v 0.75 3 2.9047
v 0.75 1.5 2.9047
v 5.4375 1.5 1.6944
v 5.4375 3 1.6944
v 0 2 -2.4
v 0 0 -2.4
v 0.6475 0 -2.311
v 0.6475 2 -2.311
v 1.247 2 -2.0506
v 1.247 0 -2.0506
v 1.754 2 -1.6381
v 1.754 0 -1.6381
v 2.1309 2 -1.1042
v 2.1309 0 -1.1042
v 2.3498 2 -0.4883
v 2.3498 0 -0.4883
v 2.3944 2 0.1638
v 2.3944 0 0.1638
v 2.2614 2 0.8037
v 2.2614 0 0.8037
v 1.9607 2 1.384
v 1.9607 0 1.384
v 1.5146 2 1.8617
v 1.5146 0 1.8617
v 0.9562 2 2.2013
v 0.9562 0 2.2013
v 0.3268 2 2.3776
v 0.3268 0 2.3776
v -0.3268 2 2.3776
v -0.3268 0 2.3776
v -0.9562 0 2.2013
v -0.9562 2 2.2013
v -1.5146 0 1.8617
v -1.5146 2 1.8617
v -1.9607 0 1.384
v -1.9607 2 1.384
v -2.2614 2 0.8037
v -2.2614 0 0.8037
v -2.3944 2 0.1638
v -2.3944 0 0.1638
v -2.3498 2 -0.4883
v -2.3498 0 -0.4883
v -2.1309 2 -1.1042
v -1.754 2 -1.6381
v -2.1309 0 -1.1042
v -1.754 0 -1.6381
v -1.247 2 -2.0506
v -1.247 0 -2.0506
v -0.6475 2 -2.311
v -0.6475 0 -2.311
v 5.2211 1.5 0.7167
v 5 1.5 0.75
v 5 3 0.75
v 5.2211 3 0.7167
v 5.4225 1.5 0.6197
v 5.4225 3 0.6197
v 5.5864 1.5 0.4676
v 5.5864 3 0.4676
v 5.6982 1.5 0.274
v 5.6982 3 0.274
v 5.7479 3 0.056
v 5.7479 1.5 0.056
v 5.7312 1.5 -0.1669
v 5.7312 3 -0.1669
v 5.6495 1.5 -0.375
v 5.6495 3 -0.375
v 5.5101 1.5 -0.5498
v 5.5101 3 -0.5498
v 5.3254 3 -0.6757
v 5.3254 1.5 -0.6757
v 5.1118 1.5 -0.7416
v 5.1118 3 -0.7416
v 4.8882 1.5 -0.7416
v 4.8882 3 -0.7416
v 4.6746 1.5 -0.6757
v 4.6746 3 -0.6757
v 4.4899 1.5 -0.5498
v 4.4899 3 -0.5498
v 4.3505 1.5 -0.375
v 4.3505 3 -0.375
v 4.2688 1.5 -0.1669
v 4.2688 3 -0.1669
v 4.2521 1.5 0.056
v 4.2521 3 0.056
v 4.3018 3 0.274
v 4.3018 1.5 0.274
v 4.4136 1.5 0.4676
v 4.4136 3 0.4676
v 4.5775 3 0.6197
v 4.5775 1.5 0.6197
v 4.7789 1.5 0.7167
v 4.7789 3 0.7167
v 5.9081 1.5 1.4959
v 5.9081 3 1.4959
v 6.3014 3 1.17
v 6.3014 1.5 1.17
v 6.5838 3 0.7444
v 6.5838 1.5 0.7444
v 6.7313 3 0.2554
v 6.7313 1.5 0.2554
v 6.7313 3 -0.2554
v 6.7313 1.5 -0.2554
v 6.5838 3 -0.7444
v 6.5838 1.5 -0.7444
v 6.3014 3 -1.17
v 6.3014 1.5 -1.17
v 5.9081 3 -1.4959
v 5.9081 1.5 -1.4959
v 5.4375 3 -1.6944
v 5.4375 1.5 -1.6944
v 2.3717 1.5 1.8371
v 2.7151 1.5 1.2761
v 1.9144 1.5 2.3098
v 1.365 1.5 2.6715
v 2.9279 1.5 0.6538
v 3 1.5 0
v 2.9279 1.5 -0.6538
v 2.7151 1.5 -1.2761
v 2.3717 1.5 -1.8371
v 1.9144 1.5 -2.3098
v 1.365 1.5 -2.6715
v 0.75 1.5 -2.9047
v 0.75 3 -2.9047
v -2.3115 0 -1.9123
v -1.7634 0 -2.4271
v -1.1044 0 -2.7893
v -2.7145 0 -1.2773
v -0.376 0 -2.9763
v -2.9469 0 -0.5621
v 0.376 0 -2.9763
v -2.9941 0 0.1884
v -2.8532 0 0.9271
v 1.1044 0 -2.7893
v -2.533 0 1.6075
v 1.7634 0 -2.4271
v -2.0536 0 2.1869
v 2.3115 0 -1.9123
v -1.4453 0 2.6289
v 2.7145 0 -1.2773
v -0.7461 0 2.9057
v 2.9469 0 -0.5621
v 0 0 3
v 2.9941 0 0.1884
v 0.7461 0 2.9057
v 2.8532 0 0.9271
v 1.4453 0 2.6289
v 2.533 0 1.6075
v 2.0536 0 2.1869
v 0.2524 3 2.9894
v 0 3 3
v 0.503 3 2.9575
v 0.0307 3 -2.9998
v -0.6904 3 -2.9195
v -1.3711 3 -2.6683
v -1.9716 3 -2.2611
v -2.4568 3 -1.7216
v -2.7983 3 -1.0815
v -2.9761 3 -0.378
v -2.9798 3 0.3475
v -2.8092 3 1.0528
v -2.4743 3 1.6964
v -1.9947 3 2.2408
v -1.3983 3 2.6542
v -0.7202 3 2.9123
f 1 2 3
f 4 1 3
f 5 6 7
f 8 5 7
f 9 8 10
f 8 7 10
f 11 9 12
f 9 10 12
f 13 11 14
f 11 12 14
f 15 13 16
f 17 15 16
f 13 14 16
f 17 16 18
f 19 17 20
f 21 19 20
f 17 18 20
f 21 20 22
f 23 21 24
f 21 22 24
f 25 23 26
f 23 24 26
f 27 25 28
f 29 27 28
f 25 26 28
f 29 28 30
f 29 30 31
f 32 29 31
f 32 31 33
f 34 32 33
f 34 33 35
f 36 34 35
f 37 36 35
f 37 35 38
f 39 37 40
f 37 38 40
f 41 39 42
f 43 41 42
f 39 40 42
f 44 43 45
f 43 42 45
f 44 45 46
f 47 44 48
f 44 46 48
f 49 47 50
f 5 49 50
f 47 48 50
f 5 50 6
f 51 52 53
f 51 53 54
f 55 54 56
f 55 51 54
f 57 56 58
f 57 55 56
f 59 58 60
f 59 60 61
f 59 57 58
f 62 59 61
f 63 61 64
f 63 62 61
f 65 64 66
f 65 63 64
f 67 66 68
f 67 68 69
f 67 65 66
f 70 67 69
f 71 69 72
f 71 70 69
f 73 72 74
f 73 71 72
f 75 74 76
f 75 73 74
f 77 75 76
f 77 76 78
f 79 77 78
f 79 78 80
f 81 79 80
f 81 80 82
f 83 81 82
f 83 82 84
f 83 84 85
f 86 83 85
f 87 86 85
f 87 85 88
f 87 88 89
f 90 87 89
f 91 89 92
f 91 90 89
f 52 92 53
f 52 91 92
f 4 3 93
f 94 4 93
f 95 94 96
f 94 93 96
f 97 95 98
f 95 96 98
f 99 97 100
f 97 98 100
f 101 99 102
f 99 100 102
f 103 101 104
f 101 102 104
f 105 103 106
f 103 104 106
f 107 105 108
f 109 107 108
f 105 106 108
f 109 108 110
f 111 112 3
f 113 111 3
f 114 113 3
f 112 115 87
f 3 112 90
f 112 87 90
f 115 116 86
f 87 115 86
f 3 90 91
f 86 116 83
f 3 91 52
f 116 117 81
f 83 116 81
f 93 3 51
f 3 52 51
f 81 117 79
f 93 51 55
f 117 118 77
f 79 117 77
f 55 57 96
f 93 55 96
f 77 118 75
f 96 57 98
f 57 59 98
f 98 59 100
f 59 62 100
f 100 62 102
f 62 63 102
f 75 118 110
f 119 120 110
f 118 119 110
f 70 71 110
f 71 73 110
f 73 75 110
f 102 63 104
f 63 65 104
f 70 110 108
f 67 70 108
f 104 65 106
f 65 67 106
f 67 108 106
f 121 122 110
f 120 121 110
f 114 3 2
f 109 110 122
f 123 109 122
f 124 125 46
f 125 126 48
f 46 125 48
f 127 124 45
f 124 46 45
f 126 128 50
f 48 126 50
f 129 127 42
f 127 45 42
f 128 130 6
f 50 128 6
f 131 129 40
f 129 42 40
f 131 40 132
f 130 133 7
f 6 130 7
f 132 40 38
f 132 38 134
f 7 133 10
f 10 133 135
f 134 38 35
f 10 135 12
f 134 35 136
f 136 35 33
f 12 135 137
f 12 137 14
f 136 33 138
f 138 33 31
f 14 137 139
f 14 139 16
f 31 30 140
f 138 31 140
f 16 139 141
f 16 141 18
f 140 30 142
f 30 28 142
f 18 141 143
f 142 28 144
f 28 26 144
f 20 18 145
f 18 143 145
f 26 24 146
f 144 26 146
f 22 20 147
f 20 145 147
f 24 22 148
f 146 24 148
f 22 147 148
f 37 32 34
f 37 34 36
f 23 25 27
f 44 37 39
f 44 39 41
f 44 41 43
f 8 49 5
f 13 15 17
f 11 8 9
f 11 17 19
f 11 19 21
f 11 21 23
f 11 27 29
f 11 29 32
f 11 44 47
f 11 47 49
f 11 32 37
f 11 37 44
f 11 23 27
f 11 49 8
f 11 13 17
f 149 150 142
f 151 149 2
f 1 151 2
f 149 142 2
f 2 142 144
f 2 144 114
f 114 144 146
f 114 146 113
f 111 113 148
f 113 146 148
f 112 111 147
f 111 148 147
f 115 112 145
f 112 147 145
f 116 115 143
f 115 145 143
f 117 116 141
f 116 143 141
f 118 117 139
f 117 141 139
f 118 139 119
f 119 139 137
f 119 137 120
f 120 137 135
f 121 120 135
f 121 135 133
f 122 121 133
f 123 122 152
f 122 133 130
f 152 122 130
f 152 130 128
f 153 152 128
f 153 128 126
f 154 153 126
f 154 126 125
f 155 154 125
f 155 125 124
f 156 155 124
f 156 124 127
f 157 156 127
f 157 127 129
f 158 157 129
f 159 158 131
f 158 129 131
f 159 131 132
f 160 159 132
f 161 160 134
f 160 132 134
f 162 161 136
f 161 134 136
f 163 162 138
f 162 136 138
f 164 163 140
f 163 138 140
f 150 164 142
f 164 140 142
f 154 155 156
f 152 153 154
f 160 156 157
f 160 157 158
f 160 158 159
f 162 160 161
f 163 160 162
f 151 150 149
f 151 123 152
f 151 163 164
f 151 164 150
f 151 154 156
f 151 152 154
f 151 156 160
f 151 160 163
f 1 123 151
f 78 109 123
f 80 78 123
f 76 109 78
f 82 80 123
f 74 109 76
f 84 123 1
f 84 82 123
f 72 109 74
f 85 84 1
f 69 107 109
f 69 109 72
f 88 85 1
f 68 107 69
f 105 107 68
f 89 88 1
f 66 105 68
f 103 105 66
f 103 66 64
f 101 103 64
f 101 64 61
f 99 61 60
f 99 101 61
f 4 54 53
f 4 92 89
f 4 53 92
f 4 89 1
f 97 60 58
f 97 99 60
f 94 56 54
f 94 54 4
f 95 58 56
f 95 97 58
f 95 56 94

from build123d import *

# Parameters (mm, degrees)
CROQUIS1_R              = 3
SALIENTE_EXTRUIR1_DEPTH = 3
SALIENTE_EXTRUIR2_START = -1.5
CROQUIS2_R              = 0.75
SALIENTE_EXTRUIR2_DEPTH = 1.5
CROQUIS3_R              = 2.4
CORTAR_EXTRUIR1_DEPTH   = 2


with BuildPart() as part:
    # Croquis1 → Saliente-Extruir1 (new body)
    with BuildSketch(Plane(origin=(0, 0, 0), x_dir=(1, 0, 0), z_dir=(0, 1, 0))):
        with Locations(Location((0, 0, 0), (0, 0, 270))):
            Circle(CROQUIS1_R)
    extrude(amount=SALIENTE_EXTRUIR1_DEPTH)

    # Croquis2 → Saliente-Extruir2 (add)
    with BuildSketch(Plane(origin=(0, 3, 0), x_dir=(1, 0, 0), z_dir=(0, 1, 0)).offset(SALIENTE_EXTRUIR2_START)):
        with BuildLine():
            Line((5.4375, 1.694430214), (0.75, 2.90473751))
            ThreePointArc((0.75, 2.90473751), (2.371708245, 1.837117307), (3, 0))
            ThreePointArc((3, 0), (2.371708245, -1.837117307), (0.75, -2.90473751))
            Line((0.75, -2.90473751), (5.4375, -1.694430214))
            ThreePointArc((5.4375, -1.694430214), (6.75, 0), (5.4375, 1.694430214))
        make_face()
        with Locations(Location((5, 0, 0), (0, 0, 270))):
            Circle(CROQUIS2_R, mode=Mode.SUBTRACT)
    extrude(amount=SALIENTE_EXTRUIR2_DEPTH)

    # Croquis3 → Cortar-Extruir1 (cut)
    with BuildSketch(Plane.XZ):
        with Locations(Location((0, 0, 0), (0, 0, 270))):
            Circle(CROQUIS3_R)
    extrude(amount=-CORTAR_EXTRUIR1_DEPTH, mode=Mode.SUBTRACT)


solid = part.part
